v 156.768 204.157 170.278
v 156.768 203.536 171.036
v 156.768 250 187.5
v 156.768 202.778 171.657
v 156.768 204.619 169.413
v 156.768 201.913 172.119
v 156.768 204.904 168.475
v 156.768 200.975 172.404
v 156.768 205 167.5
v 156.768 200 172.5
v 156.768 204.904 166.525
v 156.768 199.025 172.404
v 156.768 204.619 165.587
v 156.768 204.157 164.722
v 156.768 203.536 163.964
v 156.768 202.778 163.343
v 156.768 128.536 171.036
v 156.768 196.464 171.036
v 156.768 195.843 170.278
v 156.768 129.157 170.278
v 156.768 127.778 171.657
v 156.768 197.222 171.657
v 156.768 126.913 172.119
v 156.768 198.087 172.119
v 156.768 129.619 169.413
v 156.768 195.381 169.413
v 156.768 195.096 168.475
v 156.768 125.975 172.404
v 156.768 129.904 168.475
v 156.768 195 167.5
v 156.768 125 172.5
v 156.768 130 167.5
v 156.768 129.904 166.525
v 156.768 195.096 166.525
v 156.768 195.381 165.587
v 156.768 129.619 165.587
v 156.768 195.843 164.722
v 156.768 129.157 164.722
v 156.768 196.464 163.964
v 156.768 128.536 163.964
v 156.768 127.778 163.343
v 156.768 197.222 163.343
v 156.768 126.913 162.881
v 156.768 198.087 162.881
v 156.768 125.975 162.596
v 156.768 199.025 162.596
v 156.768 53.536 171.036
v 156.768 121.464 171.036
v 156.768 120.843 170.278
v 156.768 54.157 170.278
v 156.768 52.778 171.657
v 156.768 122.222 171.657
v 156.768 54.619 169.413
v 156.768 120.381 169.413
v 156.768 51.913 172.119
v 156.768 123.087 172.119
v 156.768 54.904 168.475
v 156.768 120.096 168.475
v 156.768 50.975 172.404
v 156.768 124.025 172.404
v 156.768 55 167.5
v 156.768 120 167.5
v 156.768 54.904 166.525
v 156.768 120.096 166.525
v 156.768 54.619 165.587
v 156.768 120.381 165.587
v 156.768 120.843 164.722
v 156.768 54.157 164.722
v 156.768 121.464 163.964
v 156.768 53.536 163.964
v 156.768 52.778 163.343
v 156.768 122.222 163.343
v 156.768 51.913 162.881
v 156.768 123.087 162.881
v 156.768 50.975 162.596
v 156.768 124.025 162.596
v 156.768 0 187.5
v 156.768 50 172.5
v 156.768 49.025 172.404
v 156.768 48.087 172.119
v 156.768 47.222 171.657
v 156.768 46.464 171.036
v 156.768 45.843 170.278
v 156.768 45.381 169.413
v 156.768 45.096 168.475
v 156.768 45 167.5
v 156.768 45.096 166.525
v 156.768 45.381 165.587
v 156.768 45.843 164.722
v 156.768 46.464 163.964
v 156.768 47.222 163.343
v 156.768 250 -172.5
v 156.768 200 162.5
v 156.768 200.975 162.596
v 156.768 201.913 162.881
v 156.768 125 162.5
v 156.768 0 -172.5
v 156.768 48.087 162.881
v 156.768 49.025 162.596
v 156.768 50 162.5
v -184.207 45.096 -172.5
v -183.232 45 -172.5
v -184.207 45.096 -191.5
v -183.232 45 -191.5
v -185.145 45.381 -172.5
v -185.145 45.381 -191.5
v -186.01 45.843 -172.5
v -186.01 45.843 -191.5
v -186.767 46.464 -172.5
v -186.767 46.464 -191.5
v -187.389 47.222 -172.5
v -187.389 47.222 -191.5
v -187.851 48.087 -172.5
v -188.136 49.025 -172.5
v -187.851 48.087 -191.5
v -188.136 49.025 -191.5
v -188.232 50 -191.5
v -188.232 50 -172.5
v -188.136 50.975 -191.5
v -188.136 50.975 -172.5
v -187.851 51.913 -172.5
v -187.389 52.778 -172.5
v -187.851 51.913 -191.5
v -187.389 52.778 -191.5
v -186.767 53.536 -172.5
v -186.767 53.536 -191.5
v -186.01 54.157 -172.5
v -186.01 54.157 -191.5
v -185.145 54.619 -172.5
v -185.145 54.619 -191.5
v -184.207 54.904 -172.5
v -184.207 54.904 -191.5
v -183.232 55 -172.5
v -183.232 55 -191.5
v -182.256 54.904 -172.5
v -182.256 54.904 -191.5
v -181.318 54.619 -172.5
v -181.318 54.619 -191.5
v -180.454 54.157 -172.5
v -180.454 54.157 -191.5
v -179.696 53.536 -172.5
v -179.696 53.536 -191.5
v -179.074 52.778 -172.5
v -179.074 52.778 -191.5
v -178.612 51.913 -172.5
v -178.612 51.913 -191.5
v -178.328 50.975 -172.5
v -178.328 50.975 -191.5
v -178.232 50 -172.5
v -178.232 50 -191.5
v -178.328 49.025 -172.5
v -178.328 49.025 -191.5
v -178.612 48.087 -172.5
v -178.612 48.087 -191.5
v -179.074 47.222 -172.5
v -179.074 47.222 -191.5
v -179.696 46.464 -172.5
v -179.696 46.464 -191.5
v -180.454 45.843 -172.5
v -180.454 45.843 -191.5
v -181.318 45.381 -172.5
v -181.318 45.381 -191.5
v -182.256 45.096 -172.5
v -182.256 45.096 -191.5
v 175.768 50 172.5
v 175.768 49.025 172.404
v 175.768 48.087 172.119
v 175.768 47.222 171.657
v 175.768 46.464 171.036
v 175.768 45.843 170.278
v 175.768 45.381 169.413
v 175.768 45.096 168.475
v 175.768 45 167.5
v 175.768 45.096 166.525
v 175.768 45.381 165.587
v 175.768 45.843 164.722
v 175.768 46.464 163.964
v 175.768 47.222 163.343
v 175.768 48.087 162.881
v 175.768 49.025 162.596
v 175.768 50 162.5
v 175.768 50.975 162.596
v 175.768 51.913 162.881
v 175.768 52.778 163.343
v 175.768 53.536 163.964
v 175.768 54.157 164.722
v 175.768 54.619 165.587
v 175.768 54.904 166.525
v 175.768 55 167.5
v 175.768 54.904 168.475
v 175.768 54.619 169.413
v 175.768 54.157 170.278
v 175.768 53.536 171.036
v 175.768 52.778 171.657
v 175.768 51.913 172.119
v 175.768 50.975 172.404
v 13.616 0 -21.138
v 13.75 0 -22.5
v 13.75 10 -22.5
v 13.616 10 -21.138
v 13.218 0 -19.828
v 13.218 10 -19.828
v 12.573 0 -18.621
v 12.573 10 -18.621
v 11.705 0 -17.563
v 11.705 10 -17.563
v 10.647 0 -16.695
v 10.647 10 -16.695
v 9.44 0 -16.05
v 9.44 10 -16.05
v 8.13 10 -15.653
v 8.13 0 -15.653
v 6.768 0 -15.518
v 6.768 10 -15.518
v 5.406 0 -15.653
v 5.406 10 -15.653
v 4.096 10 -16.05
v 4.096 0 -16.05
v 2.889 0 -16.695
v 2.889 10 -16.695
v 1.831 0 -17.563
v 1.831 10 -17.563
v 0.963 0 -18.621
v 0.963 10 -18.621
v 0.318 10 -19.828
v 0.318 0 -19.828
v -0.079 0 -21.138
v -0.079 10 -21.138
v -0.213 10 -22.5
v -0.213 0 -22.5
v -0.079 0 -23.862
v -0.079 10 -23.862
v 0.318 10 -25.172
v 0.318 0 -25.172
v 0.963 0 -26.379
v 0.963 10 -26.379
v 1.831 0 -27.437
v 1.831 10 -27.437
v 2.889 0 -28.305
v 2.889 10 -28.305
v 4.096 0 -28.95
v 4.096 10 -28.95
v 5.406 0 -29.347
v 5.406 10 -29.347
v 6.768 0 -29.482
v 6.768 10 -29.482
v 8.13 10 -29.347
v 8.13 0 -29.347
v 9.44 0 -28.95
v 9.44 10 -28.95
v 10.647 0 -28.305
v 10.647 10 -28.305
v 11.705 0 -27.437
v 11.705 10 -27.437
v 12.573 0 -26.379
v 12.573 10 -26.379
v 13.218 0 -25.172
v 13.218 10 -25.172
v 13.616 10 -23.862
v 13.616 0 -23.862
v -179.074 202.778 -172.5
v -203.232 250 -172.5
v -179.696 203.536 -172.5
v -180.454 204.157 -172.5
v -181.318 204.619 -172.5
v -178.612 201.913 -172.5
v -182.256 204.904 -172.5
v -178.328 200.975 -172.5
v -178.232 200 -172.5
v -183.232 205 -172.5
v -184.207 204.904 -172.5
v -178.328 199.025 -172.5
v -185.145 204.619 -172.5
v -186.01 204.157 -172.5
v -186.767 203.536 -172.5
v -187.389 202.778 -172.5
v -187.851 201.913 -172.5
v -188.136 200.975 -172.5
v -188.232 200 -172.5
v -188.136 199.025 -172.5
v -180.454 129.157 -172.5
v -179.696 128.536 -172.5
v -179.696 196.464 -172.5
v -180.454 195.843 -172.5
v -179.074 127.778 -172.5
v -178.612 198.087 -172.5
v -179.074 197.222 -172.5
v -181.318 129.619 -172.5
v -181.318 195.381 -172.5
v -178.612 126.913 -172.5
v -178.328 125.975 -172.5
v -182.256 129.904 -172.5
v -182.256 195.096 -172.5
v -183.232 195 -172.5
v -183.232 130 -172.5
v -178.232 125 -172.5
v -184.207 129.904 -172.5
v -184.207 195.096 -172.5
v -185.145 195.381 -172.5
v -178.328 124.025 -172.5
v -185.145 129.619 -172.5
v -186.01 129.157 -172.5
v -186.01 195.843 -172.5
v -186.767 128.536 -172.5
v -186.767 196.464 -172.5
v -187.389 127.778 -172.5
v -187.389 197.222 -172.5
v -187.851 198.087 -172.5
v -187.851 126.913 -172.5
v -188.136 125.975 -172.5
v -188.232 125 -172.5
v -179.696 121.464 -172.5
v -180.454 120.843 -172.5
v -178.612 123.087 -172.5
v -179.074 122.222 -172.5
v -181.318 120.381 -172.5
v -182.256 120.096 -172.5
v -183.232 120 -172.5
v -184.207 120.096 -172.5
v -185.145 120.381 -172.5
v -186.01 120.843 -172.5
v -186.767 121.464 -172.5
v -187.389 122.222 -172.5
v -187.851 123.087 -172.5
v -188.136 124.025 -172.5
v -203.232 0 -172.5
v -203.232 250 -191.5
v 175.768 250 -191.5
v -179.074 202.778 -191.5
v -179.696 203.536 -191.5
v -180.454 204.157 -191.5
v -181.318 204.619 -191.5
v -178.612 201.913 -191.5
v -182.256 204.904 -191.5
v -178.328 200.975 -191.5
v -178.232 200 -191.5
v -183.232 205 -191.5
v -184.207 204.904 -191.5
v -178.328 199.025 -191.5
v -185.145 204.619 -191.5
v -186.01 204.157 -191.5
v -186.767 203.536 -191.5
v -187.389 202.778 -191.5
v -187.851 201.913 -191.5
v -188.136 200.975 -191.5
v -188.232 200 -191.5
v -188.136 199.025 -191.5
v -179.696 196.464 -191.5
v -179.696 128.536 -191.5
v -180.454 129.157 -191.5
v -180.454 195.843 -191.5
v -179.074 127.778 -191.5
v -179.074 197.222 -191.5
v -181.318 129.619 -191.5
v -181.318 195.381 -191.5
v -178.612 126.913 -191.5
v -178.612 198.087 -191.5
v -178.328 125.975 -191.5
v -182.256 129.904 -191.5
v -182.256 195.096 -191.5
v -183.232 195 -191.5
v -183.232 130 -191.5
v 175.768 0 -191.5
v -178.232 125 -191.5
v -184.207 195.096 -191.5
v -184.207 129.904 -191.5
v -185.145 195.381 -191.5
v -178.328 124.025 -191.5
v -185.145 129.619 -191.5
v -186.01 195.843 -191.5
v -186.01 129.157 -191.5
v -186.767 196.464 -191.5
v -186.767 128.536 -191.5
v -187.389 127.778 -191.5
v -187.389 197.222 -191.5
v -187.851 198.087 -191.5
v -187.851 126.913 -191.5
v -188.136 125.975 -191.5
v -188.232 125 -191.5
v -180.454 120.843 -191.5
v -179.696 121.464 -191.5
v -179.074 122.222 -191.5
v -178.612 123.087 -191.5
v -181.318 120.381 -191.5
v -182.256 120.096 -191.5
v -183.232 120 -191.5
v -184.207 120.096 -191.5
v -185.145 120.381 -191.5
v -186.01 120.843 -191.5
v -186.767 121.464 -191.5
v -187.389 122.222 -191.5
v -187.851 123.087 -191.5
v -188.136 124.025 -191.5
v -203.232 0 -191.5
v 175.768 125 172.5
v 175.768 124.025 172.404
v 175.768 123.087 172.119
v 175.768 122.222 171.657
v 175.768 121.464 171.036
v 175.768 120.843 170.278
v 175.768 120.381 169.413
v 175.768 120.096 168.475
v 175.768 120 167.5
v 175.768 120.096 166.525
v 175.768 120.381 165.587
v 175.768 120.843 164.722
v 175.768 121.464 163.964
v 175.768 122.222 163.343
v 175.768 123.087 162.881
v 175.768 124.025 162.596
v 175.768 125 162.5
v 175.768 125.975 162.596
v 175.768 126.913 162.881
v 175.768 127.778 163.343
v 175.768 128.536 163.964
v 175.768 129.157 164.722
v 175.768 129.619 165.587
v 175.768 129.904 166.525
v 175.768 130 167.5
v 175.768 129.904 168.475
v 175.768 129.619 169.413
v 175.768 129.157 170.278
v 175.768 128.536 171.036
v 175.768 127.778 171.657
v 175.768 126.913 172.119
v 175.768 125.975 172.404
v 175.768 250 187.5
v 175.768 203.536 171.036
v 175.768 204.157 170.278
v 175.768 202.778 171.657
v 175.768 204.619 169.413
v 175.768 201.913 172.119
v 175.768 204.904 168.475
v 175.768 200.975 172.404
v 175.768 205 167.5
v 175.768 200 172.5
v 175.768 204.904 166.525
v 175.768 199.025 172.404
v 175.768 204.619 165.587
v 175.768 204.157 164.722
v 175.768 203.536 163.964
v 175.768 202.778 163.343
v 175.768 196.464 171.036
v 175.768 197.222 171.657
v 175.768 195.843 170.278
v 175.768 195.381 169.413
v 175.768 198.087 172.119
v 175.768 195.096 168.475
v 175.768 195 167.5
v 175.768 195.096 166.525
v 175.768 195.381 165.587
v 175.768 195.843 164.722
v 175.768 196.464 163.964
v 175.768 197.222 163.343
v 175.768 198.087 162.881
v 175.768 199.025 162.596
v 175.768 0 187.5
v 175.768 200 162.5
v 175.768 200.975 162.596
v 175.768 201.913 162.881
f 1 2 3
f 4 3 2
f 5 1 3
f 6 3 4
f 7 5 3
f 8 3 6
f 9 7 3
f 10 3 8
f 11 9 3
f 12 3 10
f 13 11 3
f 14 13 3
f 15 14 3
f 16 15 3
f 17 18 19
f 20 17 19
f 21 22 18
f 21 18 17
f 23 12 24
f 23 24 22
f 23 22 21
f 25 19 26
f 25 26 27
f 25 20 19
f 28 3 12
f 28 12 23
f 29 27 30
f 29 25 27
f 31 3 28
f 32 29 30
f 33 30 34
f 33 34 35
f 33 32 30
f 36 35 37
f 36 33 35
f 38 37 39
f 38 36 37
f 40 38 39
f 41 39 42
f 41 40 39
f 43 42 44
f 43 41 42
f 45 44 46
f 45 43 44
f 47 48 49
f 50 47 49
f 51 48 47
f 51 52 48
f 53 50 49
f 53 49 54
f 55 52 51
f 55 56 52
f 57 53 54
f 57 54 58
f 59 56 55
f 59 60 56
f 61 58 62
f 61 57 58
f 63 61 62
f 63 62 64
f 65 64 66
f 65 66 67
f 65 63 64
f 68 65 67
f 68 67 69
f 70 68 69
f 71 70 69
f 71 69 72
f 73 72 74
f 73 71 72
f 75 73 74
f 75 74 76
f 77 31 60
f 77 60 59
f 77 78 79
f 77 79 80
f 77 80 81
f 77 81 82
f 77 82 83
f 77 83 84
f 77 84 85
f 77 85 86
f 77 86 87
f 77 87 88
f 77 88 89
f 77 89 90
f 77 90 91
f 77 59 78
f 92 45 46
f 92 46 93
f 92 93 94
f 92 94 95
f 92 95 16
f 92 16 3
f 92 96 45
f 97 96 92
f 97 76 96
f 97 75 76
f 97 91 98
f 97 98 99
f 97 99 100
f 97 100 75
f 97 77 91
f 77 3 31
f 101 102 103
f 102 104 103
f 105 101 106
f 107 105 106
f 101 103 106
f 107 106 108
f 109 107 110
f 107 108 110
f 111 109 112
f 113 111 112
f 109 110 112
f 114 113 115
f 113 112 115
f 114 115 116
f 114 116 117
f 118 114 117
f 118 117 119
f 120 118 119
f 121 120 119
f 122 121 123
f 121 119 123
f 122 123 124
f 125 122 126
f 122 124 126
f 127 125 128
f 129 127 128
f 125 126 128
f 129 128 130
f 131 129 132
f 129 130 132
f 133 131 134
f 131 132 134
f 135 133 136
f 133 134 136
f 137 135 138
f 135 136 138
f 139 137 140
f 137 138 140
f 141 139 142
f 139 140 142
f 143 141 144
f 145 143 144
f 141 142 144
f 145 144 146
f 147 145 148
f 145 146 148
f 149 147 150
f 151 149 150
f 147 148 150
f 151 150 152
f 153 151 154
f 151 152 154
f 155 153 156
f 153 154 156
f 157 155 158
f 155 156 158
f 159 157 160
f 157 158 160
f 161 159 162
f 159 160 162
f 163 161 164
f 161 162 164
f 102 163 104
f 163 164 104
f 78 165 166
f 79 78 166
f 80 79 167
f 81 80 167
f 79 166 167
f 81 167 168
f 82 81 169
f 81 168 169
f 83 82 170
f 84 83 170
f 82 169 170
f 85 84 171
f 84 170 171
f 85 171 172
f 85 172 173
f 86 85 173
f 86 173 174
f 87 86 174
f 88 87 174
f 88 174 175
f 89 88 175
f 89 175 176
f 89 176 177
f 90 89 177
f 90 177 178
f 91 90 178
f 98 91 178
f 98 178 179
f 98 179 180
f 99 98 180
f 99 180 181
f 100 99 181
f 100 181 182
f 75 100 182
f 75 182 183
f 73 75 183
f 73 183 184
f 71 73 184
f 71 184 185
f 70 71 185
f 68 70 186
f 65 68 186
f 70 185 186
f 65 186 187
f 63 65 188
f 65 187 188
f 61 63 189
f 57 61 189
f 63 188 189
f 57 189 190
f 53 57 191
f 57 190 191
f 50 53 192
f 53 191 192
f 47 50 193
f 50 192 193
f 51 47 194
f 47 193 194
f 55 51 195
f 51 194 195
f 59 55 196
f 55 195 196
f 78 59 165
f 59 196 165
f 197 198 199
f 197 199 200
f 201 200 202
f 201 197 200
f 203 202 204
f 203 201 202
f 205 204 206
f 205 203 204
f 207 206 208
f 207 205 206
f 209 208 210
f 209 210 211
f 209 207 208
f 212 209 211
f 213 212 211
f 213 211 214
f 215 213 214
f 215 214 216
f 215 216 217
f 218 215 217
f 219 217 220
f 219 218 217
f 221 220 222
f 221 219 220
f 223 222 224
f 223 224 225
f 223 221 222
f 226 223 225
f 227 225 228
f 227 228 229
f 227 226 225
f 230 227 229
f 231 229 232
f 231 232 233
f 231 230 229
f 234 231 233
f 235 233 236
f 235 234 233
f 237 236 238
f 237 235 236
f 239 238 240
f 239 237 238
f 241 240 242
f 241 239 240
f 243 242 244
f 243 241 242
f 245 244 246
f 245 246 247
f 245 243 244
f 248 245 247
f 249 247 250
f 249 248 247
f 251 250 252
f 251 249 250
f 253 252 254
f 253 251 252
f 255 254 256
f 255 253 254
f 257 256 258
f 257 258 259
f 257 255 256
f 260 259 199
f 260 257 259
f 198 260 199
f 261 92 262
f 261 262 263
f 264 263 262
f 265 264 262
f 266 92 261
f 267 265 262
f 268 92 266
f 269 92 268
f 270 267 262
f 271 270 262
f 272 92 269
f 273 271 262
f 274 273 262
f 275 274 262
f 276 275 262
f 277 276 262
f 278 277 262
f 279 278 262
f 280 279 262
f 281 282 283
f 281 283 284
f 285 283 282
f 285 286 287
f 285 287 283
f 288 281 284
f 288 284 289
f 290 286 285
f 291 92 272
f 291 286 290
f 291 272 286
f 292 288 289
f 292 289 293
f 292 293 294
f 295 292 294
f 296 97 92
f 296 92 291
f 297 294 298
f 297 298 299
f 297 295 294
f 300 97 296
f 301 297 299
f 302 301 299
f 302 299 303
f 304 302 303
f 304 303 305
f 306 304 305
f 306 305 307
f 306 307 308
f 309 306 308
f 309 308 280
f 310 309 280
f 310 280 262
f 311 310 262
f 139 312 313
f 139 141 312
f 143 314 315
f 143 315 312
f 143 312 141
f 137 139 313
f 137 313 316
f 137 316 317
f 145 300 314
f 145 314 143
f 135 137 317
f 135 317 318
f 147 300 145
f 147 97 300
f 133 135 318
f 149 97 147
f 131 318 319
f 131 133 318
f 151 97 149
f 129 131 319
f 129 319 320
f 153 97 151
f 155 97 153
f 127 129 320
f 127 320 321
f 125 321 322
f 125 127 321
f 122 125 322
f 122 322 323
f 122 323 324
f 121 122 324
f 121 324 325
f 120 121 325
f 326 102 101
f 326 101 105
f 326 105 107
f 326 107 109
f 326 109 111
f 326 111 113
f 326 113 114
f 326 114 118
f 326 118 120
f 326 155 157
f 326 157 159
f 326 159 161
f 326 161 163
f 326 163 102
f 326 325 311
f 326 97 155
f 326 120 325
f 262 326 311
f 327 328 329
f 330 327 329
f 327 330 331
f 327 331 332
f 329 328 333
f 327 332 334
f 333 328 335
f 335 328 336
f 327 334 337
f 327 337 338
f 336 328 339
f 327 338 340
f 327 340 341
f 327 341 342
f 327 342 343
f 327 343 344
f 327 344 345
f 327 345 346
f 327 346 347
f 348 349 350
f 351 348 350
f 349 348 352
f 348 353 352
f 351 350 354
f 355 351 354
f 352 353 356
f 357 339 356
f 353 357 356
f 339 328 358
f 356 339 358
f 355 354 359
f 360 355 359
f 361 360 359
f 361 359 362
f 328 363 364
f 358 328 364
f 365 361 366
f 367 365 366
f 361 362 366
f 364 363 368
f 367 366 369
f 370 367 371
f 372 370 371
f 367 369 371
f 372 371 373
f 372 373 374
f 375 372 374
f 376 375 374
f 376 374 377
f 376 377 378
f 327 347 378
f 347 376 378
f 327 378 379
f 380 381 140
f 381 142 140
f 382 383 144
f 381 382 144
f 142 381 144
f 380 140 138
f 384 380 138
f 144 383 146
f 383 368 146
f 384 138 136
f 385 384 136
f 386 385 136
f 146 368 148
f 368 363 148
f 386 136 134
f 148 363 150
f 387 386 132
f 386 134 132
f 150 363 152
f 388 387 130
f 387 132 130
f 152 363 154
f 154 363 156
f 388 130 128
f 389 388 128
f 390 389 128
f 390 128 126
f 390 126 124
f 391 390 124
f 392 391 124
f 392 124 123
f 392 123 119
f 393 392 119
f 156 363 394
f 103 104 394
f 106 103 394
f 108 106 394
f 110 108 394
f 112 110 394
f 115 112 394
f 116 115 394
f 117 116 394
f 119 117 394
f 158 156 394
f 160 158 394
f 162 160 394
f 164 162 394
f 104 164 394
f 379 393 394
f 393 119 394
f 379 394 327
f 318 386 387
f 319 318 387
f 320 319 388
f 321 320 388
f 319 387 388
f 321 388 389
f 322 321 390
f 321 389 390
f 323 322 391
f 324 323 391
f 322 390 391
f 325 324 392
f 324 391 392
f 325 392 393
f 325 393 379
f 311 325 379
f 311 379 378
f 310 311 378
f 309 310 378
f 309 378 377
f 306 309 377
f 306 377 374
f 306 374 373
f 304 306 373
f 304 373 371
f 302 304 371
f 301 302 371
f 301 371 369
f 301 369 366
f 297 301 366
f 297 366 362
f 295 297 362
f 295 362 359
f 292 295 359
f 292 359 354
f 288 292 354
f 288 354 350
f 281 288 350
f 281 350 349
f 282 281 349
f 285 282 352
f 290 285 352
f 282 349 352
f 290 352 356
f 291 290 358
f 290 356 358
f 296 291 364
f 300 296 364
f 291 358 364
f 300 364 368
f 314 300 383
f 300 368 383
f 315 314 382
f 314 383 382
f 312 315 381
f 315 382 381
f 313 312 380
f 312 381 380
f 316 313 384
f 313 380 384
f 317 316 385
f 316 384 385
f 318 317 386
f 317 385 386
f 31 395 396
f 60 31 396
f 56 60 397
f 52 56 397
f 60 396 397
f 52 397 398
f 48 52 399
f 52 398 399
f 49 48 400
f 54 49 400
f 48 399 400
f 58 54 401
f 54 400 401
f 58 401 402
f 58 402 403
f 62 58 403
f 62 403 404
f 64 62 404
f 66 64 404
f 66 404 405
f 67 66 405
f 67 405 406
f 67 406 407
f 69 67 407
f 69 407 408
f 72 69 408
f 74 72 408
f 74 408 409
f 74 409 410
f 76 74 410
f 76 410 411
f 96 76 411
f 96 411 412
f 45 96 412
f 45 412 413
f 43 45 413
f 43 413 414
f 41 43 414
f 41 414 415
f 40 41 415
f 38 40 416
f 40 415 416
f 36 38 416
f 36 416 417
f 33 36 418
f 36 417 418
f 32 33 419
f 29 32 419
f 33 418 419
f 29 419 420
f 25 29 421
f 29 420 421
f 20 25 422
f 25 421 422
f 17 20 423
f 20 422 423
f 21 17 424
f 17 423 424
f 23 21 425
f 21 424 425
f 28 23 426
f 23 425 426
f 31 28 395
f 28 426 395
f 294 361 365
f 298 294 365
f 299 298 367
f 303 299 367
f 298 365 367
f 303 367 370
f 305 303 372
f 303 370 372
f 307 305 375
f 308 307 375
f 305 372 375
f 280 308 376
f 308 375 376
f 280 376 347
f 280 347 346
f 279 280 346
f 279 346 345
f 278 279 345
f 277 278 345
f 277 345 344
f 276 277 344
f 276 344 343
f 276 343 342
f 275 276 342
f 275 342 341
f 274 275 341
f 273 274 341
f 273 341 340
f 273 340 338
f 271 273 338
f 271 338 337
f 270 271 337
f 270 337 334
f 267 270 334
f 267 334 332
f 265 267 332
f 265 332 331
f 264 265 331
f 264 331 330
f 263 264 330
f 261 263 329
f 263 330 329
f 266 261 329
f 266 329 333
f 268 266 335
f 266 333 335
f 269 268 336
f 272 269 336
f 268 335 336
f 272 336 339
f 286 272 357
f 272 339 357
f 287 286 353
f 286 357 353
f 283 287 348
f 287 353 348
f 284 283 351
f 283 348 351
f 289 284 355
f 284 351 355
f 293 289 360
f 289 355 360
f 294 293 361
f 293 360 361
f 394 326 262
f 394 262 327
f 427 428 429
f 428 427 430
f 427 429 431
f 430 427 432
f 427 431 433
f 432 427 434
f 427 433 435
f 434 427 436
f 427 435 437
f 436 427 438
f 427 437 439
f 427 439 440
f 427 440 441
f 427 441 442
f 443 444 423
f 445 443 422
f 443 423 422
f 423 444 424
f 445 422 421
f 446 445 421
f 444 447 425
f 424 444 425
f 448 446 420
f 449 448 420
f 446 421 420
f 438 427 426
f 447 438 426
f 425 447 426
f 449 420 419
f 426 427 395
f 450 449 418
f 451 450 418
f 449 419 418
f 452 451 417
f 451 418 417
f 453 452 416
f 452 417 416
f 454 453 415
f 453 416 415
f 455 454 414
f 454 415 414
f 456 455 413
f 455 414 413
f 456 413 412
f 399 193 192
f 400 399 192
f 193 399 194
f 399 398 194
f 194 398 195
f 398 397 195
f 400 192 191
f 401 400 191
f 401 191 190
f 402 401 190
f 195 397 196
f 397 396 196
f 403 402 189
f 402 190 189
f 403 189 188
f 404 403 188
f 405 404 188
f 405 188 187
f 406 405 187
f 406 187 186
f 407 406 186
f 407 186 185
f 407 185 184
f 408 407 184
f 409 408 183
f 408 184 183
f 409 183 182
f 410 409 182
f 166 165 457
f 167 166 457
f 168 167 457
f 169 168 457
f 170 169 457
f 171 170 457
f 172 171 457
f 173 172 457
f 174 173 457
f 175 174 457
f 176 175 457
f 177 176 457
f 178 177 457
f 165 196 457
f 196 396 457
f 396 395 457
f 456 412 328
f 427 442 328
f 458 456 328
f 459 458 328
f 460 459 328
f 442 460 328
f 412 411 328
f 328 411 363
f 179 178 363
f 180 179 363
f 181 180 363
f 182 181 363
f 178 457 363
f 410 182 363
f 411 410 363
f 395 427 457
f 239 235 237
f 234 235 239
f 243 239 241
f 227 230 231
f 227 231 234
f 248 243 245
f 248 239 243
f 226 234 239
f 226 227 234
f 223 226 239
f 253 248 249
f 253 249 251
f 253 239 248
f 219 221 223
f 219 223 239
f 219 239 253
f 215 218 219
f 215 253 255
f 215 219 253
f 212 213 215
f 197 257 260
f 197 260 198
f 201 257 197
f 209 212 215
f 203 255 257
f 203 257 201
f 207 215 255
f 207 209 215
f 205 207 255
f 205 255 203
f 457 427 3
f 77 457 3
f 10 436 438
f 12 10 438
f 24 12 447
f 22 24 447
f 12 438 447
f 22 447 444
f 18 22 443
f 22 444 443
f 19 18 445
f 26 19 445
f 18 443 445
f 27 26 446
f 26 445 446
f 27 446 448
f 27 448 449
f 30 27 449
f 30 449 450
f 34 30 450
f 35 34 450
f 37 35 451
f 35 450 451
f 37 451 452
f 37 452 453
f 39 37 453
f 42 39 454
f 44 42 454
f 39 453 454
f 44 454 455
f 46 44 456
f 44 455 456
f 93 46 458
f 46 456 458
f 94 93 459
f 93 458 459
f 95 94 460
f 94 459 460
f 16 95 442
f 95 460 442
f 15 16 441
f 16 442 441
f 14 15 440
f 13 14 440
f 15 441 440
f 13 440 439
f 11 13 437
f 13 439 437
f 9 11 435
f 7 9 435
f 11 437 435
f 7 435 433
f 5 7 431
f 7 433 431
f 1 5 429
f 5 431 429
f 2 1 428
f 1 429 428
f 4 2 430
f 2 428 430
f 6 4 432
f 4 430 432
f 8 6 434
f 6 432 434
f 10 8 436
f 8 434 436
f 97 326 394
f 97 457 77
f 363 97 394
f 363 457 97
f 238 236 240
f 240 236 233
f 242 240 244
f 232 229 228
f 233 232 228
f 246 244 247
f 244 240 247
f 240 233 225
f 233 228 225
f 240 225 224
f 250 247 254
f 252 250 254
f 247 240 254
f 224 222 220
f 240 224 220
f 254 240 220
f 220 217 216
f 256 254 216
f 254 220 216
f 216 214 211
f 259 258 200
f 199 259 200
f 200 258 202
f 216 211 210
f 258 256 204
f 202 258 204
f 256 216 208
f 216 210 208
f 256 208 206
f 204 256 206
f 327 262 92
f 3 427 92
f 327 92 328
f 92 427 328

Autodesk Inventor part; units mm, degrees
ref_plane "YZ Plane" through (0, 0, 0) normal (1, 0, 0) x (0, 1, 0)
ref_plane "XZ Plane" through (0, 0, 0) normal (0, 1, 0) x (-1, 0, 0)
ref_plane "XY Plane" through (0, 0, 0) normal (0, 0, 1) x (1, 0, 0)
sketch "Sketch1" plane through (0, 0, 0) normal (0, 1, 0) x (-1, 0, 0)
  line L0 (-156.7682, 187.5) -> (-156.7682, -172.5)
  line L1 (-156.7682, 187.5) -> (203.2318, 187.5) construction
  line L2 (-156.7682, -172.5) -> (203.2318, -172.5)
  line L3 (-149.2682, 187.5) -> (-119.2682, 187.5) construction
  point P0 (0, 0)
  dimension "d0" = 360
  dimension "d1" = 90
  dimension "d2" = 360
surface extrude "ExtrusionSrf1" sketch "Sketch1" along normal blind 250 shown yes curves L0 L2
thicken "Thicken1" operation new thickness 19 both sides no extend neighbours no toward (1, 0, 0) faces at (156.7682, 83.3333, 67.5) (36.7682, 83.3333, -172.5)
hole "Hole1" at (-183.2318, 200, -172.5) direction (0, 0, -1) diameter 10 end through all
hole "Hole2" at (-183.2318, 125, -172.5) direction (0, 0, -1) diameter 10 end through all
hole "Hole3" at (-183.2318, 50, -172.5) direction (0, 0, -1) diameter 10 end through all
hole "Hole4" at (156.7682, 200, 167.5) direction (1, 0, 0) diameter 10 end through all
hole "Hole5" at (156.7682, 125, 167.5) direction (1, 0, 0) diameter 10 end through all
hole "Hole6" at (156.7682, 50, 167.5) direction (1, 0, 0) diameter 10 end through all
sketch "Sketch3" plane through (-203.2318, 0, -191.5) normal (0, -1, 0) x (1, 0, 0)
  line L0 (360, 379) -> (360, 19) projected
  line L1 (360, 19) -> (0, 19) projected
  circle A0 centre (210, 169) radius 6.9816
  point P0 (203.2318, 191.5)
  dimension "d75" = 150
  dimension "d76" = 150
extrude "Extrusion1" add sketch "Sketch3" against normal blind 10 separate body
properties part number "ConcreteFormwork" material "Wood (Birch)"
